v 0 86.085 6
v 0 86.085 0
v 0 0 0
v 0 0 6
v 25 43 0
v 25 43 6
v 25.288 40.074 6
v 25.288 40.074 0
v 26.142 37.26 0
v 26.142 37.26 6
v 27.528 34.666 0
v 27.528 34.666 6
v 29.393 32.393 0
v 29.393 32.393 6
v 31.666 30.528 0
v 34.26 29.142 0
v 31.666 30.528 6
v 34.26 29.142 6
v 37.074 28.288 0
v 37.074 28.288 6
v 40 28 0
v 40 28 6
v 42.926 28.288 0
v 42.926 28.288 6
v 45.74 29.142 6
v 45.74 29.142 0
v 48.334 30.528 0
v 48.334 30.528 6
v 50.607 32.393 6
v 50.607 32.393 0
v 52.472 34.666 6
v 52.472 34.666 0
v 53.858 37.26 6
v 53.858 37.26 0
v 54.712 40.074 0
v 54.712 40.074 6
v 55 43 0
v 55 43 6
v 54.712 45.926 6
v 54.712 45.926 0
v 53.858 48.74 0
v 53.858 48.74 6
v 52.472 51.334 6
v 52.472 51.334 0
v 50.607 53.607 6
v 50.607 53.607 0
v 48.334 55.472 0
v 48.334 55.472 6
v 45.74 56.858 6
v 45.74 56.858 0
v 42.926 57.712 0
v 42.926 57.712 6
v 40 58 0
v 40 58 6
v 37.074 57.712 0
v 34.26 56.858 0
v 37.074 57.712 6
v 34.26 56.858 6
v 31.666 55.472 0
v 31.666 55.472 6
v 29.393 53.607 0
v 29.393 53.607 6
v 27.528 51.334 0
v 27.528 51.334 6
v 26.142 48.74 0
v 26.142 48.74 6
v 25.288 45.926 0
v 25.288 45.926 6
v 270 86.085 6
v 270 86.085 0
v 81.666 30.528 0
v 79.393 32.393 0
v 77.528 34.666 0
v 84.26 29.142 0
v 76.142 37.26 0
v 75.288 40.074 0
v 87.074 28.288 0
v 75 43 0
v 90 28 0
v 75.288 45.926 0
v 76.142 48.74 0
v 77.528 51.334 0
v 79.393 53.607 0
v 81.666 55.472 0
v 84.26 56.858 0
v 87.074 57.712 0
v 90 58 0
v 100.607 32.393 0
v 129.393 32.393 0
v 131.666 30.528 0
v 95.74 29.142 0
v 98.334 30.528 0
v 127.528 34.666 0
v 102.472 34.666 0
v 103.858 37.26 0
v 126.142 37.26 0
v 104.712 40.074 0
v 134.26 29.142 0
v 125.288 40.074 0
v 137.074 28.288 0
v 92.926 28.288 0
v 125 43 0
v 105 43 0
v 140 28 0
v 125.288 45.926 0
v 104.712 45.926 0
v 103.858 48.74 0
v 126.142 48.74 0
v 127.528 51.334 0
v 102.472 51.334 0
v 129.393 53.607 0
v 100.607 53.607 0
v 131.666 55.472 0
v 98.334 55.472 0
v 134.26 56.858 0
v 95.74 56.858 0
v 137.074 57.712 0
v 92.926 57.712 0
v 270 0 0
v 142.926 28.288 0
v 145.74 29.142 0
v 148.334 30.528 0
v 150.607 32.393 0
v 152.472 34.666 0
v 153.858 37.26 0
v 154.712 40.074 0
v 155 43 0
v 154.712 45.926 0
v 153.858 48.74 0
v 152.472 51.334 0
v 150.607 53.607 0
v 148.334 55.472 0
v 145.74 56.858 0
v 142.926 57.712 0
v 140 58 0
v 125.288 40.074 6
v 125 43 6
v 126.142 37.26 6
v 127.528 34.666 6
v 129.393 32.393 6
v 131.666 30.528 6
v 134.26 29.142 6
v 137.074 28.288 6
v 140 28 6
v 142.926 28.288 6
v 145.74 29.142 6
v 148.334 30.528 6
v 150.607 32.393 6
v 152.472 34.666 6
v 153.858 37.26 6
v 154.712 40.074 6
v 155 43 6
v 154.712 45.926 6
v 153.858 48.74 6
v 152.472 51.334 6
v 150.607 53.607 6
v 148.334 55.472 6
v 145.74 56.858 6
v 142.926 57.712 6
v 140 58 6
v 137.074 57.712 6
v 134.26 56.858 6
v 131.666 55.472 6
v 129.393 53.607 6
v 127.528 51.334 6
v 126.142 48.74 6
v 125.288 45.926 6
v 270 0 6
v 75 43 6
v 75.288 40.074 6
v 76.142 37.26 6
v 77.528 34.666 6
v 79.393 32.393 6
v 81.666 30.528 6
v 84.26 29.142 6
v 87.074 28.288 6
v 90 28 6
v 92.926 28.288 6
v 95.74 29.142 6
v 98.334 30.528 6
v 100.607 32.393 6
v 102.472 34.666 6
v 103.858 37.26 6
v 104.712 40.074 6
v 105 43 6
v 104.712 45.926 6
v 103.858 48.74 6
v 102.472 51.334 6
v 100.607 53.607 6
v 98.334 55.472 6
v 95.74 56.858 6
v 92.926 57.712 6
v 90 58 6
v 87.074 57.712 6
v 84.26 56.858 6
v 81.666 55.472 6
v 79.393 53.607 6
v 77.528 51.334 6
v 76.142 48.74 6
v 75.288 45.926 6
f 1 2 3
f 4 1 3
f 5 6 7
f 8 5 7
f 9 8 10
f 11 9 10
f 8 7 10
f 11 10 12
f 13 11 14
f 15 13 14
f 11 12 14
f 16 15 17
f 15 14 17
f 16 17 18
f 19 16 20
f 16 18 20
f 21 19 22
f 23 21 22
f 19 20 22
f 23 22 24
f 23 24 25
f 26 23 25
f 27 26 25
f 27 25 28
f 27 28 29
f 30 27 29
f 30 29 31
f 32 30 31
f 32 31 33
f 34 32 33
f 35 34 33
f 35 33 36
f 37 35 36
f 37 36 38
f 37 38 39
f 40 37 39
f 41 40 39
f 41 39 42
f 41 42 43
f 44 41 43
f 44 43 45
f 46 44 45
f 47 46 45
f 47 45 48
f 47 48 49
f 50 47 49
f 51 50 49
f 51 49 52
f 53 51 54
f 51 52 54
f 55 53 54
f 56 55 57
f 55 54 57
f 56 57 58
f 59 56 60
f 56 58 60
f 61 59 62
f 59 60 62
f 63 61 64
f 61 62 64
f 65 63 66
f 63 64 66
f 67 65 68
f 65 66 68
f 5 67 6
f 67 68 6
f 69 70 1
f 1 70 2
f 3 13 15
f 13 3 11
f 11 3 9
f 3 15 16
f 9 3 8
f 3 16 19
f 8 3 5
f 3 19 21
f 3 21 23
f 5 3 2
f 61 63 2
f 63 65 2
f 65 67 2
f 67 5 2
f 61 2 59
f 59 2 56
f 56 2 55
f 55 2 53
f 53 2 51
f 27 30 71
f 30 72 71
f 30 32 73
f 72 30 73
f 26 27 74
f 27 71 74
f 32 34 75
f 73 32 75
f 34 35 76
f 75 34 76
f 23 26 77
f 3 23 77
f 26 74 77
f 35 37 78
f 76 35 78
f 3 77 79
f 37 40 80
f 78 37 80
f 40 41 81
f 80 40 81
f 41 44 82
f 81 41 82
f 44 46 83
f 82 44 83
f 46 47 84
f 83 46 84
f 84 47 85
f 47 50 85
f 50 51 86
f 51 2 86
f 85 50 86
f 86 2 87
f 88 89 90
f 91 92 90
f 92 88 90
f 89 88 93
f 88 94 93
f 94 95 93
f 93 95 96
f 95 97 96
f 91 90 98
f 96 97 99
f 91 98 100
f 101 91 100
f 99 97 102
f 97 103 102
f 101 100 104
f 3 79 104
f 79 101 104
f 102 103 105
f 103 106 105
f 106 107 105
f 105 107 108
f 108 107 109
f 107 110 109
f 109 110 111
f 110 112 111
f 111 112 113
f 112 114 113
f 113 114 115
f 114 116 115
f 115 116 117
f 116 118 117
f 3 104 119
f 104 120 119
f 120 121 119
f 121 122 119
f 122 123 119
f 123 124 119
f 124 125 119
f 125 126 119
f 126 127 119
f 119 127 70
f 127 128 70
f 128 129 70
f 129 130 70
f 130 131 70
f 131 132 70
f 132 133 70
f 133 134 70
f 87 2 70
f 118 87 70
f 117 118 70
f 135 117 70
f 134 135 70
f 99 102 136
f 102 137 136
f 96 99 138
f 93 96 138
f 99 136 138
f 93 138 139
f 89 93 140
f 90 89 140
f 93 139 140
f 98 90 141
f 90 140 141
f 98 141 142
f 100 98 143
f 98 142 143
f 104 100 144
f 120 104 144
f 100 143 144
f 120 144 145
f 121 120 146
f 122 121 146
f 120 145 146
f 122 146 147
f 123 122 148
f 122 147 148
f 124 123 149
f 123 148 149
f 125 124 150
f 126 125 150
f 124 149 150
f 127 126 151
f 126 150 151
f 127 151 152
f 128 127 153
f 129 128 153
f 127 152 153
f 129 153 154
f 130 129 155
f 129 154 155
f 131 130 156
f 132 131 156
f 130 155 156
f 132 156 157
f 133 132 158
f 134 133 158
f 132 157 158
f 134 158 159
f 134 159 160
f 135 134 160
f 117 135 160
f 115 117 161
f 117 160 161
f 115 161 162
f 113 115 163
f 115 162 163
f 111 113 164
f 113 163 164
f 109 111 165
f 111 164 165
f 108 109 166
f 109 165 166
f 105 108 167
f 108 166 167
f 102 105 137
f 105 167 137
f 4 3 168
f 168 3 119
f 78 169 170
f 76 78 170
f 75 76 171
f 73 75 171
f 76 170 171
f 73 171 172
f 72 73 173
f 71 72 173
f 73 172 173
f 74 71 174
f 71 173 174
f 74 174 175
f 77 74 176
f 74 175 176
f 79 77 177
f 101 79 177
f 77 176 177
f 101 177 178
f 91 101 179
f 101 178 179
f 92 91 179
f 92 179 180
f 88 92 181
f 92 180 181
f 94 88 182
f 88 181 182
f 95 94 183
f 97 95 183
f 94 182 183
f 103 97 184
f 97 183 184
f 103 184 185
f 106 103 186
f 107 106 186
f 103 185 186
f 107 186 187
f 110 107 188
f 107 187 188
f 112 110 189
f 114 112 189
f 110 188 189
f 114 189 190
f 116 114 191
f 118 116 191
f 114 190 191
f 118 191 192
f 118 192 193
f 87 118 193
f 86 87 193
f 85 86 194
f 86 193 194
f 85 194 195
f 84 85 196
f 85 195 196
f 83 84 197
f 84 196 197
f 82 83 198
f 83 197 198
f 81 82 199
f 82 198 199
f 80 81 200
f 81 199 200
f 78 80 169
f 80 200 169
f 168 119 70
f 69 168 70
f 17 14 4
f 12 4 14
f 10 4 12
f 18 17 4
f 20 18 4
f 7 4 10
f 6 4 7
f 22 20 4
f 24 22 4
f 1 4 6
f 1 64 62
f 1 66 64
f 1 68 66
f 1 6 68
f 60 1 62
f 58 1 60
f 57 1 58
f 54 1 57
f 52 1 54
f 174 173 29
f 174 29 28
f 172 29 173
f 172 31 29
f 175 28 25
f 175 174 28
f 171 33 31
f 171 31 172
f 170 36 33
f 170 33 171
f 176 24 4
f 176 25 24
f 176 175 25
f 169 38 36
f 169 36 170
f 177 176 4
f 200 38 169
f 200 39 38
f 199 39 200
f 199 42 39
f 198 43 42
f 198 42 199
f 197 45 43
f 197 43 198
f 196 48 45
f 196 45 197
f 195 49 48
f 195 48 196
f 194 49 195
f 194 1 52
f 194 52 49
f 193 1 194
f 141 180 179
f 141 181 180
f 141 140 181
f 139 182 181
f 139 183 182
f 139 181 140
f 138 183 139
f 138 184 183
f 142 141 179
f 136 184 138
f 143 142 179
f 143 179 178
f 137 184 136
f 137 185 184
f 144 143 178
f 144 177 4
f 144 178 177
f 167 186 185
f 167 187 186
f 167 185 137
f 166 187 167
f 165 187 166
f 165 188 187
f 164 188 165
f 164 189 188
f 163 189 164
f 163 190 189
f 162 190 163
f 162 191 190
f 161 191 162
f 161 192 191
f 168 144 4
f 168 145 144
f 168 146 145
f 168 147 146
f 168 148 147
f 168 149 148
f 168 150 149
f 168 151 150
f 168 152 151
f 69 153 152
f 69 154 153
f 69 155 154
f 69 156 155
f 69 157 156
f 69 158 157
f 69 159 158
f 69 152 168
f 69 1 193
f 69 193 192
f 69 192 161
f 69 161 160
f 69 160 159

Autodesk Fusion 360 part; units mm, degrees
sketch "Control Panel Top" plane through (0, 0, 0) normal (0, 0, 1) x (1, 0, 0)
  line L0 (0, 0) -> (270, 0)
  line L1 (270, 0) -> (270, 86.085)
  line L2 (270, 86.085) -> (0, 86.085)
  line L3 (0, 86.085) -> (0, 0)
  dimension "d6" = 270
  dimension "d7" = 86.085
extrude "Extrude1" add sketch "Control Panel Top" along normal blind 6
sketch "Button Layout" plane through (0, 0, 6) normal (0, 0, 1) x (-1, 0, 0)
  line L0 (0, -86.085) -> (0, 0)
  line L1 (0, 0) -> (-270, 0)
  line L2 (-270, 0) -> (-270, -86.085)
  line L3 (-270, -86.085) -> (0, -86.085)
  circle A0 centre (-90, -43) radius 15
  circle A1 centre (-140, -43) radius 15
  circle A2 centre (-40, -43) radius 15
  dimension "d12" = 30
  dimension "d13" = 30
  dimension "d14" = 30
  dimension "d17" = 40
  dimension "d20" = 50
  dimension "d21" = 43
  dimension "d22" = 43
  dimension "d23" = 43
  dimension "d24" = 50
extrude "Extrude2" cut sketch "Button Layout" against normal blind 6 contours A0 | A1
extrude "Extrude3" cut sketch "Button Layout" against normal blind 6 contours A2
equation "MDFThickness = 6 mm" comment "Thickness of the MDF board"
equation "d2 = MDFThickness"
equation "controlPanelTopLength = 75 mm" comment "Length of the top plate of the control panel"
equation "controlPanelTopWidth = 250 mm" comment "Width of the top plate of the control panel"
equation "d9 = -MDFThickness"
equation "arcadeButtonDiameter = 30 mm" comment "Diameter of the Arcade Game Buttons"
equation "d12 = arcadeButtonDiameter"
equation "d13 = arcadeButtonDiameter"
equation "d14 = arcadeButtonDiameter"
equation "d15 = -MDFThickness"
equation "d21 = ( 86 / 2 ) * 1 mm"
equation "d22 = ( 86 / 2 ) * 1 mm"
equation "d23 = ( 86 / 2 ) * 1 mm"
